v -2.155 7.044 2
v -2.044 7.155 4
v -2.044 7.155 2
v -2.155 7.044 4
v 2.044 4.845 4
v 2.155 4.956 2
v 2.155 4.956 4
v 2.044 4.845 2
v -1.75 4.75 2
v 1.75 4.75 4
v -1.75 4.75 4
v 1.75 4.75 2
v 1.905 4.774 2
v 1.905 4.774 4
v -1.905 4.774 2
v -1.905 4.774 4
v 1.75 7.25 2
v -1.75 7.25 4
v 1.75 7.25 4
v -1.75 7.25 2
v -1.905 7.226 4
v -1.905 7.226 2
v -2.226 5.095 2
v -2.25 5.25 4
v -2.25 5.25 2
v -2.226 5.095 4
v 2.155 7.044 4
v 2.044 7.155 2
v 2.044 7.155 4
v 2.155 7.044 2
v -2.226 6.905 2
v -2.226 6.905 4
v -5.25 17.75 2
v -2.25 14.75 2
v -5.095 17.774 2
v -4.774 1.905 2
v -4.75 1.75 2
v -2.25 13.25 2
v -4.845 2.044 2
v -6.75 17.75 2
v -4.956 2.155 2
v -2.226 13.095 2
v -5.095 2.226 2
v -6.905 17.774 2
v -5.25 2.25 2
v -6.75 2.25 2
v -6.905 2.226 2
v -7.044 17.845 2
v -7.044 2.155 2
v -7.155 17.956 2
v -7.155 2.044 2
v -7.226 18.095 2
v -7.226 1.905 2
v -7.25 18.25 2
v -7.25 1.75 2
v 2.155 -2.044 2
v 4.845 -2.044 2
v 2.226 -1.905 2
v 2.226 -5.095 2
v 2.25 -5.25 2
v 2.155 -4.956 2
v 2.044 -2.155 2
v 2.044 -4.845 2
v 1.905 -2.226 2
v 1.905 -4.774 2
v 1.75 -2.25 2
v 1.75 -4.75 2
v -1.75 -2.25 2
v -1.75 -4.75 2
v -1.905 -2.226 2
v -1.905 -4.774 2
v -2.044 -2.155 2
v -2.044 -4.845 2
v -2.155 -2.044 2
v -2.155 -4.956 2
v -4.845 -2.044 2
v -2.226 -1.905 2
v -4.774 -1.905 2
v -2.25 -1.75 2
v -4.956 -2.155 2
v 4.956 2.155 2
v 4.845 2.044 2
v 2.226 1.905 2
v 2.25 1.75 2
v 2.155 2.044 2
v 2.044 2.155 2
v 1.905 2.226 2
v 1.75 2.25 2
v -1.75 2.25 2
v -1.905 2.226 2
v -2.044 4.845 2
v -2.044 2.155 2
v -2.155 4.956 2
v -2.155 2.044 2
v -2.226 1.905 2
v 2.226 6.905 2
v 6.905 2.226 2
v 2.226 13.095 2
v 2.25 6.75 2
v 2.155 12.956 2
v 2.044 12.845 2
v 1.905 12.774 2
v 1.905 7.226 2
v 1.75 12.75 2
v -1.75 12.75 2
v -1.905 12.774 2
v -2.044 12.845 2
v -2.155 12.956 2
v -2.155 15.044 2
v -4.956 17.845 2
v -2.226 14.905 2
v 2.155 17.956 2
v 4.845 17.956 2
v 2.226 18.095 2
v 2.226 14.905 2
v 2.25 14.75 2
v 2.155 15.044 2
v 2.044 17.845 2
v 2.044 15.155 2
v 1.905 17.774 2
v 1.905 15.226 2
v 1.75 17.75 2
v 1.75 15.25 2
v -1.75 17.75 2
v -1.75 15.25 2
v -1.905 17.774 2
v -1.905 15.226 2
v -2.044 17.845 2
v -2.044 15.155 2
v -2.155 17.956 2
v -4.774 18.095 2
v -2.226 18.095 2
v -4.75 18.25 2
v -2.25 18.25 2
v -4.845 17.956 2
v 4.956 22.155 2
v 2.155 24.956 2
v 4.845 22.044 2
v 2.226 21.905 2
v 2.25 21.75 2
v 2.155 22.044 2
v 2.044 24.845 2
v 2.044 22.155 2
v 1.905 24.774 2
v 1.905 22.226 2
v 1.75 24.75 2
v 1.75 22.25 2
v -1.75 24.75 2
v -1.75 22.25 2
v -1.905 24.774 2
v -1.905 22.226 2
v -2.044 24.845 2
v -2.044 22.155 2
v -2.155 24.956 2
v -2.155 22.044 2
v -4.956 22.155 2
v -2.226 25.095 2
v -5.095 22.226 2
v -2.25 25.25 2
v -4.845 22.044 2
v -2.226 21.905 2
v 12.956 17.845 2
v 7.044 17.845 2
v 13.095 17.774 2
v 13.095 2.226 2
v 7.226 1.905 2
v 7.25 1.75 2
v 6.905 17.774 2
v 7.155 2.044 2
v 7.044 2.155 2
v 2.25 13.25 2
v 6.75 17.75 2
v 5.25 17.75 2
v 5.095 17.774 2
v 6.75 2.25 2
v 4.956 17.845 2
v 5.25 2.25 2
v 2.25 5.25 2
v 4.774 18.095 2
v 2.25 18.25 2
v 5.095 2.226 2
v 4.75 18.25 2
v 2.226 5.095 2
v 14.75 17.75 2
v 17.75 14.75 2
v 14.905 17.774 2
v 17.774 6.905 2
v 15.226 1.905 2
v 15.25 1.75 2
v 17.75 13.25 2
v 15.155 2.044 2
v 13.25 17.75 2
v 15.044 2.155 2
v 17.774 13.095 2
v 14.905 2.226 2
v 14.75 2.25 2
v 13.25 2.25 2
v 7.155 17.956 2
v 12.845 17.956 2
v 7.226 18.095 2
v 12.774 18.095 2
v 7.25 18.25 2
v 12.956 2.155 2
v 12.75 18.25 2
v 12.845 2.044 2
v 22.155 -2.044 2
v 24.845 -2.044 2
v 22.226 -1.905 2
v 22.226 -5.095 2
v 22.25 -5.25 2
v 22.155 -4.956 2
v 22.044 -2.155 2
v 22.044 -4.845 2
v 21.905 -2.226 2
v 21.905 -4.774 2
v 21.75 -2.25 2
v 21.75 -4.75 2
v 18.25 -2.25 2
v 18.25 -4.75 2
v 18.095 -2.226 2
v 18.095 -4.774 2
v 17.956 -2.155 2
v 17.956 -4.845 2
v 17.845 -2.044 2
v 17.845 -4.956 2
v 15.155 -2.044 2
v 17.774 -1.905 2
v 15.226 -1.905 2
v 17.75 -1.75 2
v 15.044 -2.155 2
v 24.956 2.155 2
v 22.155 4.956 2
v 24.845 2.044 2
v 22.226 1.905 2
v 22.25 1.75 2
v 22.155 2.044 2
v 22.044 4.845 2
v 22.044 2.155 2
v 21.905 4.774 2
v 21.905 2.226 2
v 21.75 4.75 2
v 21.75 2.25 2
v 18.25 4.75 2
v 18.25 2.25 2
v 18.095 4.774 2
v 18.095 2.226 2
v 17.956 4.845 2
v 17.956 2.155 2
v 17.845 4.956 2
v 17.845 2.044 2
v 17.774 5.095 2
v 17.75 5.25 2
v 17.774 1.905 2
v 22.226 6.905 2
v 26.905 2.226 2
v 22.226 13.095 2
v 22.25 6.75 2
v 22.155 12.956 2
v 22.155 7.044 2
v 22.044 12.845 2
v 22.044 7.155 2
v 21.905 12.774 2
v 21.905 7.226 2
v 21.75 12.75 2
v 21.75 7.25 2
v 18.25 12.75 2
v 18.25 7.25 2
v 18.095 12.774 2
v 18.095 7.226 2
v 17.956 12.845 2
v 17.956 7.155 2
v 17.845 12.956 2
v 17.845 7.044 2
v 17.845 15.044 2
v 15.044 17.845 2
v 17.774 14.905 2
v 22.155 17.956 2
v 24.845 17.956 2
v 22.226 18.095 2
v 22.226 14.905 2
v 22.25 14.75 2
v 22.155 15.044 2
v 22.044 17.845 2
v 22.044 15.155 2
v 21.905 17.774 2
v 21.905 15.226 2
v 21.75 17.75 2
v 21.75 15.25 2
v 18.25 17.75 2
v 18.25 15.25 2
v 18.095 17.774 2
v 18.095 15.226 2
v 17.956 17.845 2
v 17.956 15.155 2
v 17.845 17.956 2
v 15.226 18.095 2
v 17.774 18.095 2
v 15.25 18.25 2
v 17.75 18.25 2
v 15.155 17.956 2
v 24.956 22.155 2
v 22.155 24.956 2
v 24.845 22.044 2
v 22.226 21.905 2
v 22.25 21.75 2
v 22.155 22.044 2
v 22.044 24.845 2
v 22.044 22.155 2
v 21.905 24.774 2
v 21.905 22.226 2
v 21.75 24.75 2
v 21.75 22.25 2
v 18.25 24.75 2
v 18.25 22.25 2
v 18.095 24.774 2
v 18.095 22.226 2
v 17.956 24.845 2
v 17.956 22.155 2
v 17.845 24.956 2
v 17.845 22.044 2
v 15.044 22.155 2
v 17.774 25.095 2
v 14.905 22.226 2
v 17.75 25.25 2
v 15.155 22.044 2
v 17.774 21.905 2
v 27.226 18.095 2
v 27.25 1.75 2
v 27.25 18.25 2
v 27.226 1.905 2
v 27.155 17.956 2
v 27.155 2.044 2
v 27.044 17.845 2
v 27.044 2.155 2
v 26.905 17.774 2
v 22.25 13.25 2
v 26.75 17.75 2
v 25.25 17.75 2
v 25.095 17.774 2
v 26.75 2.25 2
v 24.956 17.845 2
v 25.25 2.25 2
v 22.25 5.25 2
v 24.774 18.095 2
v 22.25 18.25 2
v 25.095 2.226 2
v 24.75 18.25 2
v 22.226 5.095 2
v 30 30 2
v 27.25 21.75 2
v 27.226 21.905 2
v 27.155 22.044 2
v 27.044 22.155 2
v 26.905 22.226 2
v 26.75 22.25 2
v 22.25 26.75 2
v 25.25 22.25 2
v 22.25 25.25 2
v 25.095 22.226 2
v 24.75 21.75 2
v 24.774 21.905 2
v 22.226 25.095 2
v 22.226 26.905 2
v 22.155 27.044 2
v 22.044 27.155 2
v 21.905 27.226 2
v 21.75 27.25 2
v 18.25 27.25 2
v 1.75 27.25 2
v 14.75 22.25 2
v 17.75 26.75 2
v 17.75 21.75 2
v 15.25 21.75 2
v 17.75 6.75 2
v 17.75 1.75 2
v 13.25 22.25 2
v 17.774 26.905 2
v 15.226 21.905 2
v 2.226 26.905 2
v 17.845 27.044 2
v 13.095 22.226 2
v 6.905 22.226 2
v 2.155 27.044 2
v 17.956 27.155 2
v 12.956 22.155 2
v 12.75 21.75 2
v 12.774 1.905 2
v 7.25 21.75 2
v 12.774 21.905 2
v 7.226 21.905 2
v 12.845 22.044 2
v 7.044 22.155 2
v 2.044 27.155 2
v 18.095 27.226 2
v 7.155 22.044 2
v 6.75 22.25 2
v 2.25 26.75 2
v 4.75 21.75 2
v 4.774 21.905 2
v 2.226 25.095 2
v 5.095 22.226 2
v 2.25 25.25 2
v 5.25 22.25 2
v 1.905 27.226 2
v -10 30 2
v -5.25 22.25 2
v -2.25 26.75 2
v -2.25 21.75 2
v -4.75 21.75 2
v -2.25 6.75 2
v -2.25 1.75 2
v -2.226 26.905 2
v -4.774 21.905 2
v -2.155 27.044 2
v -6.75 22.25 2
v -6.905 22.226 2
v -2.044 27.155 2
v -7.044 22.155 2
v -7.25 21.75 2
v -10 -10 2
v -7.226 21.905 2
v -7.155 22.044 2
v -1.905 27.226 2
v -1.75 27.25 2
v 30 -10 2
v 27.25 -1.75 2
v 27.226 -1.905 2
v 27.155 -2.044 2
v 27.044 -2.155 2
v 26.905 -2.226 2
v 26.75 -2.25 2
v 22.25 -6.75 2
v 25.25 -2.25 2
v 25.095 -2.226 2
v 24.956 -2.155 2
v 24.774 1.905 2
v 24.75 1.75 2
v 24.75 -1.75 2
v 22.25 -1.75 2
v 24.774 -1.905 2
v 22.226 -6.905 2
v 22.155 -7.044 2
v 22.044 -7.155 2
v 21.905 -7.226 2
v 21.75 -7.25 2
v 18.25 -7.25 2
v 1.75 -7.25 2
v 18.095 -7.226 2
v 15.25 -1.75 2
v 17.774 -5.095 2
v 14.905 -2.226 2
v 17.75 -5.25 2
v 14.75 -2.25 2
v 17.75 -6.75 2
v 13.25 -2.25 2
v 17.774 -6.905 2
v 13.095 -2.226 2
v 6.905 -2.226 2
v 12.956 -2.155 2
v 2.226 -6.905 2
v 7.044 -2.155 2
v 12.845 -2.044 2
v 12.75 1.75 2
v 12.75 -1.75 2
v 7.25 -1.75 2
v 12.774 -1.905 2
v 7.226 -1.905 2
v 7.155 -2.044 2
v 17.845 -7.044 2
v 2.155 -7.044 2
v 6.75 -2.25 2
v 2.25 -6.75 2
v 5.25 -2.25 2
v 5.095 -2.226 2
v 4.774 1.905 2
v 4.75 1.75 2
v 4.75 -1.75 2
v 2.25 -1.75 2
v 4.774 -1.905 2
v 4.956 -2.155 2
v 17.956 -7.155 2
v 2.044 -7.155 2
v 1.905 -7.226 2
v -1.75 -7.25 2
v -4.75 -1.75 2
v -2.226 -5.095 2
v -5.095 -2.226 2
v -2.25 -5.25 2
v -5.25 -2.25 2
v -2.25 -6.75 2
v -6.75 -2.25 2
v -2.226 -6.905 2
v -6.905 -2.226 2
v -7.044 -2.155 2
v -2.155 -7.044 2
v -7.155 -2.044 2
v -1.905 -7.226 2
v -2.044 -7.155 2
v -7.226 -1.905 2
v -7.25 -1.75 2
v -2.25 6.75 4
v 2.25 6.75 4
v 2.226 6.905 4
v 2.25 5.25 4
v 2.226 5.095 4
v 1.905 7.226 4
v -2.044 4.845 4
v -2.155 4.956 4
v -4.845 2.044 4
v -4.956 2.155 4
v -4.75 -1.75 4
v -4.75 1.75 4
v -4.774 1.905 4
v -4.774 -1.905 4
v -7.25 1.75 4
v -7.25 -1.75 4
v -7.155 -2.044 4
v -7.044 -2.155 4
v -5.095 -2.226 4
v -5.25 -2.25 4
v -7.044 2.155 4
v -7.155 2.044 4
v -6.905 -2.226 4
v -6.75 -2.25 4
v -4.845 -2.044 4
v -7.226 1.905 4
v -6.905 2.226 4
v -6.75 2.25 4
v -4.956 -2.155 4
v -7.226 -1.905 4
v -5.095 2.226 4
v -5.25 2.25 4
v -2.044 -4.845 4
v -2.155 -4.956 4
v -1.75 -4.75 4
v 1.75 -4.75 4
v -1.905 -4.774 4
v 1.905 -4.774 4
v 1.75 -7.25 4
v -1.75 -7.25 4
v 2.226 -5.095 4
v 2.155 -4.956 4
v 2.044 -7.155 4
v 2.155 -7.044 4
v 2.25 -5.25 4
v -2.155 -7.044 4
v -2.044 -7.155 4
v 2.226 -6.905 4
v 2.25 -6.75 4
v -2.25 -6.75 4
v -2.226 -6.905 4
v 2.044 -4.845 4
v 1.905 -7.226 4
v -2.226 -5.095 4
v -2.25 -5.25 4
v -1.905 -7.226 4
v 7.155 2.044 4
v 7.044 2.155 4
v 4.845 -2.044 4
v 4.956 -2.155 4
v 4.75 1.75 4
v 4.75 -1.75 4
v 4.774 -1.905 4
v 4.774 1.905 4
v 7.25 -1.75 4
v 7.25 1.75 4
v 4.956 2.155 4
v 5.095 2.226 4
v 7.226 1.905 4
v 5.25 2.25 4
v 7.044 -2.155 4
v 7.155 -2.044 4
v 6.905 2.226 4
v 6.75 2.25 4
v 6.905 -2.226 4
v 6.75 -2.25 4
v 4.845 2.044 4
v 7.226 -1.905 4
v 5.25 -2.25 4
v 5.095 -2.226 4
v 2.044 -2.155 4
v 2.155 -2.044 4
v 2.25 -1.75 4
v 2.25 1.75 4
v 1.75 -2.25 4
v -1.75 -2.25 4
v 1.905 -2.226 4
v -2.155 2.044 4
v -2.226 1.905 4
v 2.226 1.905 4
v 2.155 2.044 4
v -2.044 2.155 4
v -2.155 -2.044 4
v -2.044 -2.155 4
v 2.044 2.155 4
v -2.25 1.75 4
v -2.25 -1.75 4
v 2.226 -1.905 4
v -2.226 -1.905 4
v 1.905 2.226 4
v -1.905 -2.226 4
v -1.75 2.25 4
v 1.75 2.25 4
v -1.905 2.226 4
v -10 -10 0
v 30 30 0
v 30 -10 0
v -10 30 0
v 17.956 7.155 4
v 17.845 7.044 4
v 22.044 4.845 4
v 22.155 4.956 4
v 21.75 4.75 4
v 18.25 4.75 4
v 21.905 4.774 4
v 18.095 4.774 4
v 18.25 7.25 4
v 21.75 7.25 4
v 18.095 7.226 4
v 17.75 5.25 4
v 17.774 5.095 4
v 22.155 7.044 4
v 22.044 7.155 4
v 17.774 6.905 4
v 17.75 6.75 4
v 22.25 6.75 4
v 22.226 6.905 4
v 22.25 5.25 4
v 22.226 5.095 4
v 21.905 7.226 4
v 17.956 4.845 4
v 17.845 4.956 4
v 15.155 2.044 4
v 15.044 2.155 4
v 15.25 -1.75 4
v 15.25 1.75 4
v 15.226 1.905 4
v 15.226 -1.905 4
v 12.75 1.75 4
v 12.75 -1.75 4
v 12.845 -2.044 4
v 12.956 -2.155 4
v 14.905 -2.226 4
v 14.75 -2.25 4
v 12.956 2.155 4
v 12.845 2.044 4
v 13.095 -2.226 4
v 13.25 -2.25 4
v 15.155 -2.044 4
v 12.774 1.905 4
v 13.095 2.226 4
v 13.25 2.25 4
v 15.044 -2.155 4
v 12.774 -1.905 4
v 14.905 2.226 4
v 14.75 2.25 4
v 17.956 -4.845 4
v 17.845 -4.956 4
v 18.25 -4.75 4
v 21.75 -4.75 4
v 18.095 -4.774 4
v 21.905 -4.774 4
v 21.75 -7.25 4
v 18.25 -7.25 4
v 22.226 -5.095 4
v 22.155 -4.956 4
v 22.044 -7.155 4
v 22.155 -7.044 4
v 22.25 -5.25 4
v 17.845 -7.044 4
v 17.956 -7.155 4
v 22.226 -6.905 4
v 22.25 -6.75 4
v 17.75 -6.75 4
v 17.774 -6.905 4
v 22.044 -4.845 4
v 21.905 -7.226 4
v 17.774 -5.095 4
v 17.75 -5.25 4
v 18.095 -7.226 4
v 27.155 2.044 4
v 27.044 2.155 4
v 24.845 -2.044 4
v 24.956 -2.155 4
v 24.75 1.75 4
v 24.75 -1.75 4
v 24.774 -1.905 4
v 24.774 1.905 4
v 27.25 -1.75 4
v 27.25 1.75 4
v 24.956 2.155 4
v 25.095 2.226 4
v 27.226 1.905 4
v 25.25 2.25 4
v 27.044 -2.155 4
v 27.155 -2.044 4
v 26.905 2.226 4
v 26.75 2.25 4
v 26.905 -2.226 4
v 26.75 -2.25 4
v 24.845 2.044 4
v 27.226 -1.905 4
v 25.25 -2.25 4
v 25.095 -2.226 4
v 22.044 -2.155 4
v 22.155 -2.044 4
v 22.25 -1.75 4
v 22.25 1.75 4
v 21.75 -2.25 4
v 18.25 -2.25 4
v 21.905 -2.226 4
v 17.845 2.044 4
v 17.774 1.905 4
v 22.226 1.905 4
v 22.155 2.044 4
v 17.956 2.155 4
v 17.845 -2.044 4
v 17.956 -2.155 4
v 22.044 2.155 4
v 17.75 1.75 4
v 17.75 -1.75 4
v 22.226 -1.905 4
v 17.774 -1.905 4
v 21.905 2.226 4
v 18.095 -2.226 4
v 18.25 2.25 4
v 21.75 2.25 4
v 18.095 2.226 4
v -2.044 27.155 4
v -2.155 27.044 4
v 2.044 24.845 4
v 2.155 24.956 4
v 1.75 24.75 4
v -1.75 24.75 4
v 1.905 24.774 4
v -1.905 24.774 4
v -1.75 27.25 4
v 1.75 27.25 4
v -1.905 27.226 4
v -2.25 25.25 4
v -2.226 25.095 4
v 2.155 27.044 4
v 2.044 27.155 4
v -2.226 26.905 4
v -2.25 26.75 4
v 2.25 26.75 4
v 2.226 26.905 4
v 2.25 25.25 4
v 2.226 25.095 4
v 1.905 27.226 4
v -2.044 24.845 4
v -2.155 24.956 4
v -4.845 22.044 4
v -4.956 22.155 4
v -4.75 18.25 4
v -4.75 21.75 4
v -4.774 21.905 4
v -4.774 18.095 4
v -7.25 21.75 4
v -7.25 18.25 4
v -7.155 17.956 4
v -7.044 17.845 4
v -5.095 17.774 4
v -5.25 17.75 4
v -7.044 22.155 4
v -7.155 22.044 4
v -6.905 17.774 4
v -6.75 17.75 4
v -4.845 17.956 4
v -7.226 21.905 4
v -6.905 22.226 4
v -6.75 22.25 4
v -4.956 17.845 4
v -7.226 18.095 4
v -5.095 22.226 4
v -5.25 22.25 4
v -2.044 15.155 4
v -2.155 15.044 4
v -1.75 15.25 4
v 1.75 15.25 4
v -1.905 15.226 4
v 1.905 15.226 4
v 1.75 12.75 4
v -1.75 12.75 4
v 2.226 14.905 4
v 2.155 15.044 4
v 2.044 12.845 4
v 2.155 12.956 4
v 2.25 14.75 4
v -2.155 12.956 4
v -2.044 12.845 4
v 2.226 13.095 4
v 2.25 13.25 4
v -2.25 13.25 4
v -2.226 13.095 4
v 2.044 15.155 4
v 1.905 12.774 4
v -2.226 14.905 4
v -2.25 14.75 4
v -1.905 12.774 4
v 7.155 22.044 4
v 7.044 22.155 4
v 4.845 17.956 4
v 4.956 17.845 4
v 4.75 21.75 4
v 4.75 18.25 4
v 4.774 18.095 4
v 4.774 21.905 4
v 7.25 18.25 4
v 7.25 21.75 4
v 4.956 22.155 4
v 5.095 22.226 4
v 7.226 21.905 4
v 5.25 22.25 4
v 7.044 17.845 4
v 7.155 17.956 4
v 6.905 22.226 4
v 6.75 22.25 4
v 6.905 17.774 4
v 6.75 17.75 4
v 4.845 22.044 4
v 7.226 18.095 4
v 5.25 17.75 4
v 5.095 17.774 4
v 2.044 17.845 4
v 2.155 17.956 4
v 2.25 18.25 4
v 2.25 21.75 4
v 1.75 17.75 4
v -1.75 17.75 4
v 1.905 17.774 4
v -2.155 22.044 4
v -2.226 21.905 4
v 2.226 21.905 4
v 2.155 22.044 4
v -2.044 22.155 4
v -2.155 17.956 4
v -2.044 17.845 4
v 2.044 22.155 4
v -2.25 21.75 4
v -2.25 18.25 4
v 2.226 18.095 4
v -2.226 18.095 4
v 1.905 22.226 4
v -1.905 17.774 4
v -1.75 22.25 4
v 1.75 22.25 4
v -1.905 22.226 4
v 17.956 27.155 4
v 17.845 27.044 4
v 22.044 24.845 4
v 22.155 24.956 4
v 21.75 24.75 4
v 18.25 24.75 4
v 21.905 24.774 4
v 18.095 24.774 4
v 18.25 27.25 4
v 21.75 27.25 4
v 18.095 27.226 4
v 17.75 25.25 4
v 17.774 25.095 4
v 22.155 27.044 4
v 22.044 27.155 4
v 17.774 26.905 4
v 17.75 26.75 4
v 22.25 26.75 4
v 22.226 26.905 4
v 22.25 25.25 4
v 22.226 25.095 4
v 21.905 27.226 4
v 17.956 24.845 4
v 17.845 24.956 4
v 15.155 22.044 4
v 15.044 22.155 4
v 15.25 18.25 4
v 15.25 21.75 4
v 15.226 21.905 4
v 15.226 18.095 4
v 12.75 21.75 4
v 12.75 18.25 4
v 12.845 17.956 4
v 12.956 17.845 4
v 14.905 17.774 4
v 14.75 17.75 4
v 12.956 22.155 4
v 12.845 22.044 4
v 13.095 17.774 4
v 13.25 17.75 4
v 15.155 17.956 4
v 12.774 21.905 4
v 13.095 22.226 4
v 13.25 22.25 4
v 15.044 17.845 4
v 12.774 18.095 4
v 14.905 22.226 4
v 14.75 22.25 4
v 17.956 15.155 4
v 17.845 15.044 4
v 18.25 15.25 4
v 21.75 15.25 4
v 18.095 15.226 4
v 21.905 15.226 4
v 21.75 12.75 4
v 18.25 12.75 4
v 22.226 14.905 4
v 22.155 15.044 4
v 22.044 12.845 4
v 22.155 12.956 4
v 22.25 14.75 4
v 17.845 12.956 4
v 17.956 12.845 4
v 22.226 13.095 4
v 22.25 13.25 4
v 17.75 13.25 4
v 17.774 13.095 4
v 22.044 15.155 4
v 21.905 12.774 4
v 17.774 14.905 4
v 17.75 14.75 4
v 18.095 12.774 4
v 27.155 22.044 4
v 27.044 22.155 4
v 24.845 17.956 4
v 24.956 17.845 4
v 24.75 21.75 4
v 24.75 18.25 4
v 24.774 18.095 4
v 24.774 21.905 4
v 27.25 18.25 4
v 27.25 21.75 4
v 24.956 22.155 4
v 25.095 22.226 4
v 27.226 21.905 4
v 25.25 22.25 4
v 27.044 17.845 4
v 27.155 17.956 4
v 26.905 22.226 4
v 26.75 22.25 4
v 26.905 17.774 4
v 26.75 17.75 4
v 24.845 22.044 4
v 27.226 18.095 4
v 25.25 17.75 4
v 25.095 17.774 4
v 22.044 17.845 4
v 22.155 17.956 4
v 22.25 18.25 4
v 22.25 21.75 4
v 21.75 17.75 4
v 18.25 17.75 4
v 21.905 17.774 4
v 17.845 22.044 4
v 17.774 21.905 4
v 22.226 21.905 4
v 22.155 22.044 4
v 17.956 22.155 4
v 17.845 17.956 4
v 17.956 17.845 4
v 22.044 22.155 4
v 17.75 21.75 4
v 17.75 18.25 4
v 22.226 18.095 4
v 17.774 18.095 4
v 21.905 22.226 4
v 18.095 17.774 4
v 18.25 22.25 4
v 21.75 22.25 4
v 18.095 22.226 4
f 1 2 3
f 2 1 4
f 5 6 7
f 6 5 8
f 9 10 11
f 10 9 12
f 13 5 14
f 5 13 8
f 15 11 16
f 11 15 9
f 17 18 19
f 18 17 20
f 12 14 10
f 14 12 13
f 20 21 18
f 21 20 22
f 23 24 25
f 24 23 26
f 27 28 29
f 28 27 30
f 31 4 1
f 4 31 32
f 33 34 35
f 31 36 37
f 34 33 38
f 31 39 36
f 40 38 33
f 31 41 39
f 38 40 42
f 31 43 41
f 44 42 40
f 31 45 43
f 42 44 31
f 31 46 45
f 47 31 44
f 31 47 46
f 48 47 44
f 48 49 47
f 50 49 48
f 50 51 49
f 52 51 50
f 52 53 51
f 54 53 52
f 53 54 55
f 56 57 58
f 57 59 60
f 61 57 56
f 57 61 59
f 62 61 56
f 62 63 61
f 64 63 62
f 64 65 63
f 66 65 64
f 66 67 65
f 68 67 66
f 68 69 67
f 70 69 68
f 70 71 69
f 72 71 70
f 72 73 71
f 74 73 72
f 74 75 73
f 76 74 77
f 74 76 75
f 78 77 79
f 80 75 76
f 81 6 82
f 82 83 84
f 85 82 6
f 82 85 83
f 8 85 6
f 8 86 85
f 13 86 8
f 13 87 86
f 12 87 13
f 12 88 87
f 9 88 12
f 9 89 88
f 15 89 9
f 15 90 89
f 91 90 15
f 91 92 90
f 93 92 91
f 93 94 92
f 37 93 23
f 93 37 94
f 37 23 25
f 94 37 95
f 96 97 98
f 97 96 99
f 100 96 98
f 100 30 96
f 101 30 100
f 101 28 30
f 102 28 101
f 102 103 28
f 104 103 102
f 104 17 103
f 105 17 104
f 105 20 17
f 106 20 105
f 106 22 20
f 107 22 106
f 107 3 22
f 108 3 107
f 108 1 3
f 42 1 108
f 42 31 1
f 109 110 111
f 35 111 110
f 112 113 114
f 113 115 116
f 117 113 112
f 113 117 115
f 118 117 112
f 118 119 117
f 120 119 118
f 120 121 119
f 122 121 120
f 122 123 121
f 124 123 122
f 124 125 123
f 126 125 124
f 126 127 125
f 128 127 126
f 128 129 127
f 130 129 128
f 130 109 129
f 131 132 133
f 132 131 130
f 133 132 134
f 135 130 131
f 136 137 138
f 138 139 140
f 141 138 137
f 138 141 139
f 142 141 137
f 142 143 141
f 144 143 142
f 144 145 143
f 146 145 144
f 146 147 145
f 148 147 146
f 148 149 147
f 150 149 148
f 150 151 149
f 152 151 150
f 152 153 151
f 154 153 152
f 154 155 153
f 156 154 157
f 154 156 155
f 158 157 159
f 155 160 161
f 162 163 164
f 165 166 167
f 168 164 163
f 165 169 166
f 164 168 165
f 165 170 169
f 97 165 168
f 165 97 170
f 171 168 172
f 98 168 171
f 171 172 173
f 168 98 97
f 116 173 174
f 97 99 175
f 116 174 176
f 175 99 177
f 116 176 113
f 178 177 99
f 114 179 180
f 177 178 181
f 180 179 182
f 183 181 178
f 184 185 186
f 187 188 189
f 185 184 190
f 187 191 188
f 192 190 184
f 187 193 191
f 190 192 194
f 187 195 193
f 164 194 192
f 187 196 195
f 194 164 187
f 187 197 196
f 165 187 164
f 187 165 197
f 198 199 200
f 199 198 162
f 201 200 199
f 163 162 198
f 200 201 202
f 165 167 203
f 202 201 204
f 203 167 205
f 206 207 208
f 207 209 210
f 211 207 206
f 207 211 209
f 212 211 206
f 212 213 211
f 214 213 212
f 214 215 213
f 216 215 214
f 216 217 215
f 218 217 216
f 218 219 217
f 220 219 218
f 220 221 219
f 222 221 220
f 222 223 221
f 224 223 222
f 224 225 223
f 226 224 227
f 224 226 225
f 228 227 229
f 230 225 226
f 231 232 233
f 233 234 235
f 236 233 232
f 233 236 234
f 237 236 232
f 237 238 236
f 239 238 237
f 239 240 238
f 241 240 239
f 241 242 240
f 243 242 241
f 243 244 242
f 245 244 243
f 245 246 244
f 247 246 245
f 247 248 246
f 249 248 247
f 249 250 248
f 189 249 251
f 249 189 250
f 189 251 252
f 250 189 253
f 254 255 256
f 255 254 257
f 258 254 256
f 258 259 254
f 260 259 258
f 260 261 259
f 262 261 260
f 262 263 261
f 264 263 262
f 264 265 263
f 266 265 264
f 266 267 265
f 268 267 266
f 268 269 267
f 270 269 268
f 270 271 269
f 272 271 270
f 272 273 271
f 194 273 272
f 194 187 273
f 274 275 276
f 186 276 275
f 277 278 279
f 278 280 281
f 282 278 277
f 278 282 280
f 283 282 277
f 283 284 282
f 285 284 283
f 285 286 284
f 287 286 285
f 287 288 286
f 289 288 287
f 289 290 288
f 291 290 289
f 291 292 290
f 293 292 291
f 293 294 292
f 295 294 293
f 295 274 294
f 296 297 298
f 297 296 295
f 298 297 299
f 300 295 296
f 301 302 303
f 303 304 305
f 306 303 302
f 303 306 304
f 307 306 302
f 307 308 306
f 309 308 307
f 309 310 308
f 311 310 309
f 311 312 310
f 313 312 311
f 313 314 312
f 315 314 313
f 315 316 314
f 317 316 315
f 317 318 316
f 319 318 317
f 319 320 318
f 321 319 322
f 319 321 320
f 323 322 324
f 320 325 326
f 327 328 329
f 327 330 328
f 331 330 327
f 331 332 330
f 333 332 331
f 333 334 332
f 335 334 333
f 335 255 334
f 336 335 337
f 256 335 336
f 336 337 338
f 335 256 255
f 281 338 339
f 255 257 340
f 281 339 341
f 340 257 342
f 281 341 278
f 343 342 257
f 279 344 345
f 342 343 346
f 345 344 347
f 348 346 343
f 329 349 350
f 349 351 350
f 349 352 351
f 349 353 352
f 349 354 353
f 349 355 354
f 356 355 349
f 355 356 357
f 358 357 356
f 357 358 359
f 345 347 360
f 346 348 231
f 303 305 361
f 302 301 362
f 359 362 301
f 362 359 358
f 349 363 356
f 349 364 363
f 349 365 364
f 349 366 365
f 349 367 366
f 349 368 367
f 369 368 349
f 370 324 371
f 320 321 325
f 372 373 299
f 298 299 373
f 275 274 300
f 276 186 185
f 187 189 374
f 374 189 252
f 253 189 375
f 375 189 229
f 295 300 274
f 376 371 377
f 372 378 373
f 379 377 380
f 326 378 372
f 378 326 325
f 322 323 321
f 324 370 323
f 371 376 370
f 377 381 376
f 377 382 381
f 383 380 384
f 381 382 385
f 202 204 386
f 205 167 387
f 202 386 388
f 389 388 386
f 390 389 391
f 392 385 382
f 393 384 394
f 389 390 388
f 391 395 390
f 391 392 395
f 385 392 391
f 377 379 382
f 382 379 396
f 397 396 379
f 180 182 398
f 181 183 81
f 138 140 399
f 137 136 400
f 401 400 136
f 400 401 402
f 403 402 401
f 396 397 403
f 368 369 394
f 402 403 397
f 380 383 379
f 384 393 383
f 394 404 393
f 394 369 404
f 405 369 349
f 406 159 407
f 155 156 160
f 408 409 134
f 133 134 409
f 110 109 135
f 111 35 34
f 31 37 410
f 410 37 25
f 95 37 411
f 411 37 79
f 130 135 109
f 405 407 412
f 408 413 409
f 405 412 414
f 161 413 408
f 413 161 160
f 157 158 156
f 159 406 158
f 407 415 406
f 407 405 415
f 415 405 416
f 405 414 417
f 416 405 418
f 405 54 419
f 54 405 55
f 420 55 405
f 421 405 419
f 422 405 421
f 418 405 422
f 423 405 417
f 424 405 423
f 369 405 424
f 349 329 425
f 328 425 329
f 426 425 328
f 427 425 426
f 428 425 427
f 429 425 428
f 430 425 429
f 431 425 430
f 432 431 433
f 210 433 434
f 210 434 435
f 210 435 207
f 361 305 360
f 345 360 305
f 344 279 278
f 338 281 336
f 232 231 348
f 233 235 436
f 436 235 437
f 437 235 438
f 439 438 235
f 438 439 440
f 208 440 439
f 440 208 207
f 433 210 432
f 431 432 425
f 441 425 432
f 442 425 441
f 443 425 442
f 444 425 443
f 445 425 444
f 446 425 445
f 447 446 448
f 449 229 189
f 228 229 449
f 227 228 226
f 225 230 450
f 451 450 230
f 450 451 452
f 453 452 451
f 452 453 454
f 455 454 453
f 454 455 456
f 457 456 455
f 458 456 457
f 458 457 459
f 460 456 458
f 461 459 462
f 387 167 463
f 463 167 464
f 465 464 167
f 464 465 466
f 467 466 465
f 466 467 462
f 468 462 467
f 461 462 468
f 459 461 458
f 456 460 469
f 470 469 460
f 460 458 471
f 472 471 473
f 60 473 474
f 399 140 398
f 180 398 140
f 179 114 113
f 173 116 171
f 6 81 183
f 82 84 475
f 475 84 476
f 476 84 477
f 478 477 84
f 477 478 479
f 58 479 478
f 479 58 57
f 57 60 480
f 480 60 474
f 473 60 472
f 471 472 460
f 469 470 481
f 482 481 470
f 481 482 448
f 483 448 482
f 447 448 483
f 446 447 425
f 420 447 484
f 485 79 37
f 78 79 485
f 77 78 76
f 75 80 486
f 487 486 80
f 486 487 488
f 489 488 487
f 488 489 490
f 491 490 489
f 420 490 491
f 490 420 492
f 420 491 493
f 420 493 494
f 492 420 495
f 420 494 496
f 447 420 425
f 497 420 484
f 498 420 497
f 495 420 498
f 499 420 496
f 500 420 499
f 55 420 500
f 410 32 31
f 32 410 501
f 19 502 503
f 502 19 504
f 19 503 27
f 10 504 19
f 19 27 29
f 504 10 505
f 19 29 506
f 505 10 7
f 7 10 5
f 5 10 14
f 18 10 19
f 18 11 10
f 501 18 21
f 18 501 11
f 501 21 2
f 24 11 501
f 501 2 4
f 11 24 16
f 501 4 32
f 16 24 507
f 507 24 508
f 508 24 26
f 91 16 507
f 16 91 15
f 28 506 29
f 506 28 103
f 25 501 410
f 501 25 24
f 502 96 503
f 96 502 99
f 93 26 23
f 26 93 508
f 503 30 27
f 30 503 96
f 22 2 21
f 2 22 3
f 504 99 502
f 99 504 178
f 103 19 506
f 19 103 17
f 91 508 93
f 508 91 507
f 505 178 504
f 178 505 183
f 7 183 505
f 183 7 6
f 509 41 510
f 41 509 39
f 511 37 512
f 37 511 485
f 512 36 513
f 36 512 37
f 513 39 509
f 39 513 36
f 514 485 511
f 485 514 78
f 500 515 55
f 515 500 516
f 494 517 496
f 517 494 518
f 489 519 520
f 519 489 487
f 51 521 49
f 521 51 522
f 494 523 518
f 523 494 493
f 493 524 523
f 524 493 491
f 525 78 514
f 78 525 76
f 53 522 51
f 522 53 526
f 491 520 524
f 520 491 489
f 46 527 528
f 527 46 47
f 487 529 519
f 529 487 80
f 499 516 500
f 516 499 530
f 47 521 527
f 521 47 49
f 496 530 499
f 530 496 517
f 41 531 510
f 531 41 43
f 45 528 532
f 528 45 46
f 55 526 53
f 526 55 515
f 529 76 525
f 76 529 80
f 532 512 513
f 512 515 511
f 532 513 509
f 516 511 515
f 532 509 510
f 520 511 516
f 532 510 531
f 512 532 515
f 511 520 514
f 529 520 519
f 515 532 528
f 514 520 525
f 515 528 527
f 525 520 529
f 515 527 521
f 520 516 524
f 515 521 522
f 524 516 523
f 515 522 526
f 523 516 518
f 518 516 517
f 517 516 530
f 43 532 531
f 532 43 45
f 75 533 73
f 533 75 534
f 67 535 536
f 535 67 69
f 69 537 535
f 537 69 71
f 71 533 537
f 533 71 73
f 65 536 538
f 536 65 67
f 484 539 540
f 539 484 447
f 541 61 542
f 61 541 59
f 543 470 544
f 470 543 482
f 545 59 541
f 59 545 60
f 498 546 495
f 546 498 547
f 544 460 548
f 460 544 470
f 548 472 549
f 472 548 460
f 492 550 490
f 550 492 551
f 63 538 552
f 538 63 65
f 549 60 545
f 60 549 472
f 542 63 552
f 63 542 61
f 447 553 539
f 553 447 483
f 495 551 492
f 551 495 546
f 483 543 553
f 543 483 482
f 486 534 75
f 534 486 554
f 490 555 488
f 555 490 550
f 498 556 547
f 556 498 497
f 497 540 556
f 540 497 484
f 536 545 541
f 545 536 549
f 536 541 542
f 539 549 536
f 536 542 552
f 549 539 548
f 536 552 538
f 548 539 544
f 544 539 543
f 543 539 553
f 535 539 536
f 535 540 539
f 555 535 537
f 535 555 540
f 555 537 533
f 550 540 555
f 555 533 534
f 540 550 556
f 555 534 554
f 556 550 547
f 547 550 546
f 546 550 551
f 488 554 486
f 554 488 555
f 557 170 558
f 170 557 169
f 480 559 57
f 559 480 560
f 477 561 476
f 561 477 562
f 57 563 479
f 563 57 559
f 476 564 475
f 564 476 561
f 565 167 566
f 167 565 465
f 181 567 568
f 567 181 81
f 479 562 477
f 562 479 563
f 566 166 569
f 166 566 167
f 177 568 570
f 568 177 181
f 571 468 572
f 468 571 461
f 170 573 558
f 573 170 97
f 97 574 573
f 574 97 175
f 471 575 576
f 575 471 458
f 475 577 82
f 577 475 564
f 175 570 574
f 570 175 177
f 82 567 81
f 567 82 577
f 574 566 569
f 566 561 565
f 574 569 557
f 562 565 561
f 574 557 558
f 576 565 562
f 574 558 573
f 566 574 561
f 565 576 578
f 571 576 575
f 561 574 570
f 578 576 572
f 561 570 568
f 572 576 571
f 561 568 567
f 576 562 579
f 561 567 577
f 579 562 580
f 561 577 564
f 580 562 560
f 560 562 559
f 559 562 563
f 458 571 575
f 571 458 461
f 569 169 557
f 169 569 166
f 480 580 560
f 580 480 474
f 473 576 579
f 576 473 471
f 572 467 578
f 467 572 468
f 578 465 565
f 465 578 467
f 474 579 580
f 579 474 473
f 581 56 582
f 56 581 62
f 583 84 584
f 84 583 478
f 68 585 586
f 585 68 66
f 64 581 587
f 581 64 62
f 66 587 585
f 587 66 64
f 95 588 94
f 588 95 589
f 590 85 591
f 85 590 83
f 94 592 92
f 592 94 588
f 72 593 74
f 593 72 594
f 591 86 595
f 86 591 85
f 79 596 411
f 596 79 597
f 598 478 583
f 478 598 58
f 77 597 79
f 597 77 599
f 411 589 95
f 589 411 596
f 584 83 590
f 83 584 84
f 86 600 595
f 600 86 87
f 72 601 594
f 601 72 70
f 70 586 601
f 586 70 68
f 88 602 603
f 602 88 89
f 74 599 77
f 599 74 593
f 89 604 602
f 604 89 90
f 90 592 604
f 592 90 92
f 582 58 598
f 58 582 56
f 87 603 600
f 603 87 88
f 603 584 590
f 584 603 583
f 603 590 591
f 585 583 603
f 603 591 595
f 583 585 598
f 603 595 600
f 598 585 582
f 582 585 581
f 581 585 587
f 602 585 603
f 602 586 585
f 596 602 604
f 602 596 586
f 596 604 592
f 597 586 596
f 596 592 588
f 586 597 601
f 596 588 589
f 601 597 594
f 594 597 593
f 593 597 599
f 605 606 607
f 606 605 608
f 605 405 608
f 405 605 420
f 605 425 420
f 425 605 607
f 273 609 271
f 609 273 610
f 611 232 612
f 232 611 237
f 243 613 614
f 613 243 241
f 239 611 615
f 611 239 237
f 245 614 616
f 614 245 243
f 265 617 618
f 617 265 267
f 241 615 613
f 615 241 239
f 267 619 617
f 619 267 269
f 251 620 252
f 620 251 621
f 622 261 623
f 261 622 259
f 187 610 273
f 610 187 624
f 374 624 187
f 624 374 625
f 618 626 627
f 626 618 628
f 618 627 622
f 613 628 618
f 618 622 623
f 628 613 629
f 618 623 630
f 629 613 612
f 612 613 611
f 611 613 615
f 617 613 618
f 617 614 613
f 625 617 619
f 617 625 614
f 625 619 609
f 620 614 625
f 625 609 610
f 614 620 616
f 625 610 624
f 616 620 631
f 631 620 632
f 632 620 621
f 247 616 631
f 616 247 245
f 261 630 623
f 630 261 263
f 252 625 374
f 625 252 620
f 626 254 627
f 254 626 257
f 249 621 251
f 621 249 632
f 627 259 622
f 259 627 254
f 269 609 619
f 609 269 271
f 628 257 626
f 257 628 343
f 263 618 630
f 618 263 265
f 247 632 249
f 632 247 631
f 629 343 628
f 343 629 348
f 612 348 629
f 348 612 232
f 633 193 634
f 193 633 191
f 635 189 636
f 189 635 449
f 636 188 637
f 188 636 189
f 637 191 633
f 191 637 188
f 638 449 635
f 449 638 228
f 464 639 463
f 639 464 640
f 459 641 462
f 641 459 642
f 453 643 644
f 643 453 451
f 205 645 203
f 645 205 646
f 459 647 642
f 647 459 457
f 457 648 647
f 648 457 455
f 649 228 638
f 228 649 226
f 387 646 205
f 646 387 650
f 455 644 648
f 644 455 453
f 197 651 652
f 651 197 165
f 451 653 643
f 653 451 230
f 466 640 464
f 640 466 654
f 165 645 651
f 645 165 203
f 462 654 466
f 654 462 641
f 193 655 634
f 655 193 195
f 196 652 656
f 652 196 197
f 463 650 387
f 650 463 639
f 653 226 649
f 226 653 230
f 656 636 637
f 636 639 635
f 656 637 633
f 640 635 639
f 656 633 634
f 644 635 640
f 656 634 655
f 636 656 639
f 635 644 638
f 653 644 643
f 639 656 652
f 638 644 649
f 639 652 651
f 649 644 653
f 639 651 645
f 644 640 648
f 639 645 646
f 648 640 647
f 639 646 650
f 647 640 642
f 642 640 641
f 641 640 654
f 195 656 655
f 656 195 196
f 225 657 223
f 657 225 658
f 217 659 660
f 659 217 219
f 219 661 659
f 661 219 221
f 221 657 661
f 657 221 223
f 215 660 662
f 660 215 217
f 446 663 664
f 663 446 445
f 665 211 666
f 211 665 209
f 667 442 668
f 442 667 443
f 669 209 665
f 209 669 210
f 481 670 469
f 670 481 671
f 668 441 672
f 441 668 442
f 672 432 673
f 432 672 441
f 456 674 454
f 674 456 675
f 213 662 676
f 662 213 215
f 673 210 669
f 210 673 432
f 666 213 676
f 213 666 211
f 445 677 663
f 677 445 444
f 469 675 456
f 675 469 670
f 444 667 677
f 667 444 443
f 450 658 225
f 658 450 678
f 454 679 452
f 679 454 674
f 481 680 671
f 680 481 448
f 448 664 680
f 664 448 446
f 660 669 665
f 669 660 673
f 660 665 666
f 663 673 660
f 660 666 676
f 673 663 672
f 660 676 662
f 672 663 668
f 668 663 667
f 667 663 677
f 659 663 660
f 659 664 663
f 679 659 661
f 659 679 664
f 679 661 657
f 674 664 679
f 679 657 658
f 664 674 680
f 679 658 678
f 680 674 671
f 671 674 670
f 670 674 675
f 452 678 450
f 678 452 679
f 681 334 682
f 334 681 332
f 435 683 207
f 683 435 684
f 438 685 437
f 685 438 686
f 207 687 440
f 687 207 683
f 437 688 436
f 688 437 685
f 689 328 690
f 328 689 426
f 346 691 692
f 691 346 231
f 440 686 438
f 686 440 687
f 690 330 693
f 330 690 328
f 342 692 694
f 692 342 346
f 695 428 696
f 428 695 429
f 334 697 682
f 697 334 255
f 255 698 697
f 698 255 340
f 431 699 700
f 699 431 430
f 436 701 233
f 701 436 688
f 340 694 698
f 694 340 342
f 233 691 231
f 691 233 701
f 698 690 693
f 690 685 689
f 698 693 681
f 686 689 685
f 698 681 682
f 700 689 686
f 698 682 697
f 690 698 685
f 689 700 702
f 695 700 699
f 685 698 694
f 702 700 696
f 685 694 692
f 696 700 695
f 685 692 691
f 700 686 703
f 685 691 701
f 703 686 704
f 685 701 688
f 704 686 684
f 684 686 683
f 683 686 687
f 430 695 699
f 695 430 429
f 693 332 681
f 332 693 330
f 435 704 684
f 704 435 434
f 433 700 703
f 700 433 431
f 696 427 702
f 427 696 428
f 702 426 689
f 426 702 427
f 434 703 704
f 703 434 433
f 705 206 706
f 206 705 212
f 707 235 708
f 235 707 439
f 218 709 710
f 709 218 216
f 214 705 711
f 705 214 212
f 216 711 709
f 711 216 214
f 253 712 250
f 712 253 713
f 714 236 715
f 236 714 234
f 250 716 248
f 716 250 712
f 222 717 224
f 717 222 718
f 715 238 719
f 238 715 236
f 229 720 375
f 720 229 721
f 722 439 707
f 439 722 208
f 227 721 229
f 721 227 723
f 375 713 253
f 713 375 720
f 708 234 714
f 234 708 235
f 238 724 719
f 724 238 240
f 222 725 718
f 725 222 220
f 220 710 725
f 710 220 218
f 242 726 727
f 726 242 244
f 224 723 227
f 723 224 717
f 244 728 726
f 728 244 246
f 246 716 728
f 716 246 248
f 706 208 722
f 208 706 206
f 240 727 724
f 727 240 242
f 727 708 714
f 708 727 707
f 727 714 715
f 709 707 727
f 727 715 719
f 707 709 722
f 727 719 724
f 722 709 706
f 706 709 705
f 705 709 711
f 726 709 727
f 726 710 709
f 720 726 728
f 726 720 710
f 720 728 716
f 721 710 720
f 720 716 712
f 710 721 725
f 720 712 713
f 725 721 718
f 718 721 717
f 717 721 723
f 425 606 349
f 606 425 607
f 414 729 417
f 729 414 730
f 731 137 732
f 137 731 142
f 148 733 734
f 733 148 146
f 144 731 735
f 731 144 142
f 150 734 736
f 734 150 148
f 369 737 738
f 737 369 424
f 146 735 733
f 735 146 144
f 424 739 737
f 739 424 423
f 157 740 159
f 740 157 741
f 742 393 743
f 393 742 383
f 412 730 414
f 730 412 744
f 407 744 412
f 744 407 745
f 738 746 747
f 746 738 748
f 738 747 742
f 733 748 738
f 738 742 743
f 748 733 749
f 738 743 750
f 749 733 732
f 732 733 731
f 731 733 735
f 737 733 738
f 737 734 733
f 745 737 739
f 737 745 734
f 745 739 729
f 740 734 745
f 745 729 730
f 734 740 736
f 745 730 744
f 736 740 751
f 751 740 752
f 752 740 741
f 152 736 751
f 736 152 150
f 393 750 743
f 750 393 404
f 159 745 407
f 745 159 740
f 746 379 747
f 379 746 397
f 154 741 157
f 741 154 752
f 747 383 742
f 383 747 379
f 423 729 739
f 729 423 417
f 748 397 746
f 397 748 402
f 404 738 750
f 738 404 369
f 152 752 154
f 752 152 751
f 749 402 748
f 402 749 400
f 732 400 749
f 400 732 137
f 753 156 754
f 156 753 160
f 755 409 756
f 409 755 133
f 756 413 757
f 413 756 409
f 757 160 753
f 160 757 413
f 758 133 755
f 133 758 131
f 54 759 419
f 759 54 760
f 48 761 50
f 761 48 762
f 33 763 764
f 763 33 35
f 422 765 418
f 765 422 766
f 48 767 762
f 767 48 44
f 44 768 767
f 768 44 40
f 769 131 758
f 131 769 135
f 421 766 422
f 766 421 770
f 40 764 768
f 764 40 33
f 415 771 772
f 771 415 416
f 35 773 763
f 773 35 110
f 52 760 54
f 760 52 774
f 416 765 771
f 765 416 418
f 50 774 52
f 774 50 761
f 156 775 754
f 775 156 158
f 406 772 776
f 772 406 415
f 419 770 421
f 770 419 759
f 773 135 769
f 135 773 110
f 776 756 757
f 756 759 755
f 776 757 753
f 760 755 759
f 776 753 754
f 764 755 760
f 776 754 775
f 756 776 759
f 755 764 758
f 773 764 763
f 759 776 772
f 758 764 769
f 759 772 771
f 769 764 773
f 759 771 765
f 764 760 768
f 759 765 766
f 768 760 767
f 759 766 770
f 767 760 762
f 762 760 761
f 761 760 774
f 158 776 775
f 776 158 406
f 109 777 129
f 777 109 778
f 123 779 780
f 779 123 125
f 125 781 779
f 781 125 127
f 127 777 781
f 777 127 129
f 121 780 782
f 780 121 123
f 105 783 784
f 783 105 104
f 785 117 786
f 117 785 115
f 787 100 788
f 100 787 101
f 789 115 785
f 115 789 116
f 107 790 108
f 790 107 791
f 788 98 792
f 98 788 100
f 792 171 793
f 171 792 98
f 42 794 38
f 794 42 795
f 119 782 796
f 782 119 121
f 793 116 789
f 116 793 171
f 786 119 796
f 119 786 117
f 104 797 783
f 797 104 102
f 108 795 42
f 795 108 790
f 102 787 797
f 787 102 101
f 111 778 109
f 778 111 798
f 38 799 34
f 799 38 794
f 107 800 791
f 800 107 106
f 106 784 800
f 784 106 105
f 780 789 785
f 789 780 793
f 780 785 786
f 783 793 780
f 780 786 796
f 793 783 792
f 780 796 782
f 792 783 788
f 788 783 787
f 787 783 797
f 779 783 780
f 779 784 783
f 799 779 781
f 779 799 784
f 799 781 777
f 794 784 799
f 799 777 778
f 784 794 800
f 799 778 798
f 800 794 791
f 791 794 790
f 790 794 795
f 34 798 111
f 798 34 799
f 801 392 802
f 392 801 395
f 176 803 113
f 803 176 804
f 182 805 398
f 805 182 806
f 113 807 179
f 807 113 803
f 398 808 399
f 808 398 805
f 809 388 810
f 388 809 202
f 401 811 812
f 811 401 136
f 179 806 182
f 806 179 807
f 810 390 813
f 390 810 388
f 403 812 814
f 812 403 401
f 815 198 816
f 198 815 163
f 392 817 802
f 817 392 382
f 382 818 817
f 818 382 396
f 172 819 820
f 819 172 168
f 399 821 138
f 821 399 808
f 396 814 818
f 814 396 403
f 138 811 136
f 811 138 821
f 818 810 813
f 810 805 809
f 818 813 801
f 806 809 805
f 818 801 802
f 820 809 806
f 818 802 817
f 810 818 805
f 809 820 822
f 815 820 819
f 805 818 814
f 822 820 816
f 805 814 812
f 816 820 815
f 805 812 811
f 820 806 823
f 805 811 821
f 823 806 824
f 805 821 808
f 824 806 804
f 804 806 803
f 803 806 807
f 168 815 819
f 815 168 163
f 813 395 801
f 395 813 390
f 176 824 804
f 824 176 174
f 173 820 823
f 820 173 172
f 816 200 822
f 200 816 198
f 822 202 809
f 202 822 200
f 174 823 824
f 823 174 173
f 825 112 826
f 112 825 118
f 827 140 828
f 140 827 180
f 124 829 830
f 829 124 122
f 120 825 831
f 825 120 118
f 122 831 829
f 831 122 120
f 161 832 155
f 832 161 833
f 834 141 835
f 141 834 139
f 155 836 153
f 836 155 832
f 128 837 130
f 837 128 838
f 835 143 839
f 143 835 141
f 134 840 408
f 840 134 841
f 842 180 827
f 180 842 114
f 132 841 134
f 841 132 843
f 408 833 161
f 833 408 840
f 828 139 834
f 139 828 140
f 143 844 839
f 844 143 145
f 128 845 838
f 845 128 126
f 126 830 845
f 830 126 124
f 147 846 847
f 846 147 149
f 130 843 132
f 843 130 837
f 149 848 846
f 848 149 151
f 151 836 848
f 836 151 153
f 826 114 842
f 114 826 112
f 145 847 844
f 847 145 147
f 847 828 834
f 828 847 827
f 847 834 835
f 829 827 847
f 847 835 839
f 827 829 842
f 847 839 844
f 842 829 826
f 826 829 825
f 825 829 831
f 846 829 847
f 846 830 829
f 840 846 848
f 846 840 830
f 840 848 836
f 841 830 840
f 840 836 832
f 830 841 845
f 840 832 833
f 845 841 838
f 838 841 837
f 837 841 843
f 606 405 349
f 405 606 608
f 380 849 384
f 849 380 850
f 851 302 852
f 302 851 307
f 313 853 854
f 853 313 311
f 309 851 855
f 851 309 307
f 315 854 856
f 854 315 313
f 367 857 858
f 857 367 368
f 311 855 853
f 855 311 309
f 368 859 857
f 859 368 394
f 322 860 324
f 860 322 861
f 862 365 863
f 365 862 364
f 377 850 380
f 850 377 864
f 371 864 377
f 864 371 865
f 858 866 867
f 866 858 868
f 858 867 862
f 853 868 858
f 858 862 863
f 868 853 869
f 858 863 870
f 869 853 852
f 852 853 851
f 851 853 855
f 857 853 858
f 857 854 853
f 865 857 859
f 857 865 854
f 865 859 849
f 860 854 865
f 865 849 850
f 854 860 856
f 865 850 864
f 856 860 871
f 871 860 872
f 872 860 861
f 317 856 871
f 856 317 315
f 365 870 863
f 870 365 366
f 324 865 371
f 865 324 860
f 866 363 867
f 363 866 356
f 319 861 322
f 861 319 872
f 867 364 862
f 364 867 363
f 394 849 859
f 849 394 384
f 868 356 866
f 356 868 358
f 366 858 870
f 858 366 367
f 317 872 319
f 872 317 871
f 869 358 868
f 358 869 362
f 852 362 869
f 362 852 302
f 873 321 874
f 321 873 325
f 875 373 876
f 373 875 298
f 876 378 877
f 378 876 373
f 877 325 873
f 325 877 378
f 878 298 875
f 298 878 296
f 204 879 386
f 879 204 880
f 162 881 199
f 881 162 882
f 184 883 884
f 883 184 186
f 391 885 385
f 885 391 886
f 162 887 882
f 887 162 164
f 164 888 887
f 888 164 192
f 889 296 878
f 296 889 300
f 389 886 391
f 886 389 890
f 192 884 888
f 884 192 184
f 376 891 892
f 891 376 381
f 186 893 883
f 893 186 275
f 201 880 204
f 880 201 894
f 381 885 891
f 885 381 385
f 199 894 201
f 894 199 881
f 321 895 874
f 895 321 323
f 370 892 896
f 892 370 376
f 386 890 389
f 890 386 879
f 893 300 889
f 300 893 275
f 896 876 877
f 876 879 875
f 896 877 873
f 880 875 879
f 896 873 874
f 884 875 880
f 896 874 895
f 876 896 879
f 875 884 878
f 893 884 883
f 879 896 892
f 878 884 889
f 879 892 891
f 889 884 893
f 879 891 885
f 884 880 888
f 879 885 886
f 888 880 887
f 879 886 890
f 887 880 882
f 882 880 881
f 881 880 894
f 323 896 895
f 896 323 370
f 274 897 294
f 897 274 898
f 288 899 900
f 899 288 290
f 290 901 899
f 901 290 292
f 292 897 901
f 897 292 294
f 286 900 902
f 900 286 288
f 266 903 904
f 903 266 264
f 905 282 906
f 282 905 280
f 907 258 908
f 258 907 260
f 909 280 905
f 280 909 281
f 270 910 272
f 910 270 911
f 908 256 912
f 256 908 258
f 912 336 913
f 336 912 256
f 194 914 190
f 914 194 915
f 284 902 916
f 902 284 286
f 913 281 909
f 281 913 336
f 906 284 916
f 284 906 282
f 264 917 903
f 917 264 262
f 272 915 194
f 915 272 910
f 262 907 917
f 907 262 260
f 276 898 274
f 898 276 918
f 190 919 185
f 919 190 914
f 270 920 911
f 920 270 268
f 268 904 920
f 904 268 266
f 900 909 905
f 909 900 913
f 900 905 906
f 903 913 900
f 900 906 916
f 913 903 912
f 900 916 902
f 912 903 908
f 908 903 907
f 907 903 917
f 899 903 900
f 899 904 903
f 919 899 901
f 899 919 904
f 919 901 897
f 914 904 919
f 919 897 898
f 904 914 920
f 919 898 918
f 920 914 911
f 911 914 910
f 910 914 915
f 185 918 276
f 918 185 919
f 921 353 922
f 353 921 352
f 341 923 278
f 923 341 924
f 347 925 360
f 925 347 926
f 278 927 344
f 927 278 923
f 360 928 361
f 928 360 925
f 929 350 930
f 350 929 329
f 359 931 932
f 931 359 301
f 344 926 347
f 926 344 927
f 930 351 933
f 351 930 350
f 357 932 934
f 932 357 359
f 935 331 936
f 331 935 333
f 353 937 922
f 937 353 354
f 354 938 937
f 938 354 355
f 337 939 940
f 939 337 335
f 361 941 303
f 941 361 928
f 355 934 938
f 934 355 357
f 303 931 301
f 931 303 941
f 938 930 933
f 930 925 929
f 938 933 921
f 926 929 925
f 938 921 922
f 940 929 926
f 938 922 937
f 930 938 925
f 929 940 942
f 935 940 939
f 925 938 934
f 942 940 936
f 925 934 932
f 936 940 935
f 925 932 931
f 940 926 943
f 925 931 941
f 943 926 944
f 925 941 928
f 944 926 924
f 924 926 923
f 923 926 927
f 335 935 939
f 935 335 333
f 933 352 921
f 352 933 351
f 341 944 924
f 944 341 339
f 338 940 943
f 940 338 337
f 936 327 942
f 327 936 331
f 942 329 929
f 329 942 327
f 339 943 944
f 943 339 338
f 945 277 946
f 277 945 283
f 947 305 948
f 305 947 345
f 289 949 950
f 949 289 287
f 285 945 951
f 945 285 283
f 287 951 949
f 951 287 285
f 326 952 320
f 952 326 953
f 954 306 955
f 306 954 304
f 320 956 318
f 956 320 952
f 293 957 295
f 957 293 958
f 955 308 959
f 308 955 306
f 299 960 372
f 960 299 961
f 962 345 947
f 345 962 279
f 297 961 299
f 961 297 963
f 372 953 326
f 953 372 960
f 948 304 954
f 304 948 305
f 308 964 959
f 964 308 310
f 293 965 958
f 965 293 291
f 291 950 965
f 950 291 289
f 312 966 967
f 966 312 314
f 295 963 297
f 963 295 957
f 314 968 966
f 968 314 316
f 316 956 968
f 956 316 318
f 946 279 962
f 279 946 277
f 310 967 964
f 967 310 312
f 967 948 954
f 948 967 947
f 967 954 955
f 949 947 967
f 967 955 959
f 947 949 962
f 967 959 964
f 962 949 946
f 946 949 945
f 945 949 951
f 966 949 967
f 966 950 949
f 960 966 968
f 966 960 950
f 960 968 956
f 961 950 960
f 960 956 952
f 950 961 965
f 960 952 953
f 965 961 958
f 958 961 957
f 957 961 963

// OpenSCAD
// file: board_joint.scad
include <consts.scad>

module board_side_joint(height, clearance=0.0) {
    linear_extrude(height)
    offset(OFFSET)
    square([
        MARGIN * 2 - OFFSET + clearance,
        MARGIN - OFFSET + clearance
    ], center=true);
}

module board_center_joint(height, clearance) {
    linear_extrude(HEIGHT)
    offset(OFFSET)
    square(MARGIN * 2 - OFFSET + clearance, center=true);
}

module board_joint(height=HEIGHT, clearance=0.0) {
    union() {
        board_center_joint(height, clearance);
        for(rot=[0 : 3]) {
            rotate([0, 0, rot*90])
            translate([0, CELL_SIZE / 2 - MARGIN * 2,])
            board_side_joint(height, clearance);
        }
    }
}
// file: consts.scad
SIZE = 2;
CELL_SIZE = 20;

HEIGHT = 2;
WALL_HEIGHT = 4;
GROUND_HEIGHT = HEIGHT * 2.5;
MARGIN = CELL_SIZE / 10;
OFFSET = 0.5;
CLEARANCE = 0.3;

HOUSE_WIDTH = CELL_SIZE - CLEARANCE;
HOUSE_DEPTH = CELL_SIZE * 2/3 - CLEARANCE;
HOUSE_HEIGHT = CELL_SIZE  * 2/3;

$fn = 20;
// main file
include <consts.scad>
include <board_joint.scad>

module cell() {
    linear_extrude(HEIGHT)
    square(CELL_SIZE, true);
    
    translate([0, 0, HEIGHT])
    board_joint();
}

for(y=[0 : SIZE - 1]) {
    for(x=[0 : SIZE - 1]) {
        translate([x * CELL_SIZE, y * CELL_SIZE])
            cell();
    }
}
